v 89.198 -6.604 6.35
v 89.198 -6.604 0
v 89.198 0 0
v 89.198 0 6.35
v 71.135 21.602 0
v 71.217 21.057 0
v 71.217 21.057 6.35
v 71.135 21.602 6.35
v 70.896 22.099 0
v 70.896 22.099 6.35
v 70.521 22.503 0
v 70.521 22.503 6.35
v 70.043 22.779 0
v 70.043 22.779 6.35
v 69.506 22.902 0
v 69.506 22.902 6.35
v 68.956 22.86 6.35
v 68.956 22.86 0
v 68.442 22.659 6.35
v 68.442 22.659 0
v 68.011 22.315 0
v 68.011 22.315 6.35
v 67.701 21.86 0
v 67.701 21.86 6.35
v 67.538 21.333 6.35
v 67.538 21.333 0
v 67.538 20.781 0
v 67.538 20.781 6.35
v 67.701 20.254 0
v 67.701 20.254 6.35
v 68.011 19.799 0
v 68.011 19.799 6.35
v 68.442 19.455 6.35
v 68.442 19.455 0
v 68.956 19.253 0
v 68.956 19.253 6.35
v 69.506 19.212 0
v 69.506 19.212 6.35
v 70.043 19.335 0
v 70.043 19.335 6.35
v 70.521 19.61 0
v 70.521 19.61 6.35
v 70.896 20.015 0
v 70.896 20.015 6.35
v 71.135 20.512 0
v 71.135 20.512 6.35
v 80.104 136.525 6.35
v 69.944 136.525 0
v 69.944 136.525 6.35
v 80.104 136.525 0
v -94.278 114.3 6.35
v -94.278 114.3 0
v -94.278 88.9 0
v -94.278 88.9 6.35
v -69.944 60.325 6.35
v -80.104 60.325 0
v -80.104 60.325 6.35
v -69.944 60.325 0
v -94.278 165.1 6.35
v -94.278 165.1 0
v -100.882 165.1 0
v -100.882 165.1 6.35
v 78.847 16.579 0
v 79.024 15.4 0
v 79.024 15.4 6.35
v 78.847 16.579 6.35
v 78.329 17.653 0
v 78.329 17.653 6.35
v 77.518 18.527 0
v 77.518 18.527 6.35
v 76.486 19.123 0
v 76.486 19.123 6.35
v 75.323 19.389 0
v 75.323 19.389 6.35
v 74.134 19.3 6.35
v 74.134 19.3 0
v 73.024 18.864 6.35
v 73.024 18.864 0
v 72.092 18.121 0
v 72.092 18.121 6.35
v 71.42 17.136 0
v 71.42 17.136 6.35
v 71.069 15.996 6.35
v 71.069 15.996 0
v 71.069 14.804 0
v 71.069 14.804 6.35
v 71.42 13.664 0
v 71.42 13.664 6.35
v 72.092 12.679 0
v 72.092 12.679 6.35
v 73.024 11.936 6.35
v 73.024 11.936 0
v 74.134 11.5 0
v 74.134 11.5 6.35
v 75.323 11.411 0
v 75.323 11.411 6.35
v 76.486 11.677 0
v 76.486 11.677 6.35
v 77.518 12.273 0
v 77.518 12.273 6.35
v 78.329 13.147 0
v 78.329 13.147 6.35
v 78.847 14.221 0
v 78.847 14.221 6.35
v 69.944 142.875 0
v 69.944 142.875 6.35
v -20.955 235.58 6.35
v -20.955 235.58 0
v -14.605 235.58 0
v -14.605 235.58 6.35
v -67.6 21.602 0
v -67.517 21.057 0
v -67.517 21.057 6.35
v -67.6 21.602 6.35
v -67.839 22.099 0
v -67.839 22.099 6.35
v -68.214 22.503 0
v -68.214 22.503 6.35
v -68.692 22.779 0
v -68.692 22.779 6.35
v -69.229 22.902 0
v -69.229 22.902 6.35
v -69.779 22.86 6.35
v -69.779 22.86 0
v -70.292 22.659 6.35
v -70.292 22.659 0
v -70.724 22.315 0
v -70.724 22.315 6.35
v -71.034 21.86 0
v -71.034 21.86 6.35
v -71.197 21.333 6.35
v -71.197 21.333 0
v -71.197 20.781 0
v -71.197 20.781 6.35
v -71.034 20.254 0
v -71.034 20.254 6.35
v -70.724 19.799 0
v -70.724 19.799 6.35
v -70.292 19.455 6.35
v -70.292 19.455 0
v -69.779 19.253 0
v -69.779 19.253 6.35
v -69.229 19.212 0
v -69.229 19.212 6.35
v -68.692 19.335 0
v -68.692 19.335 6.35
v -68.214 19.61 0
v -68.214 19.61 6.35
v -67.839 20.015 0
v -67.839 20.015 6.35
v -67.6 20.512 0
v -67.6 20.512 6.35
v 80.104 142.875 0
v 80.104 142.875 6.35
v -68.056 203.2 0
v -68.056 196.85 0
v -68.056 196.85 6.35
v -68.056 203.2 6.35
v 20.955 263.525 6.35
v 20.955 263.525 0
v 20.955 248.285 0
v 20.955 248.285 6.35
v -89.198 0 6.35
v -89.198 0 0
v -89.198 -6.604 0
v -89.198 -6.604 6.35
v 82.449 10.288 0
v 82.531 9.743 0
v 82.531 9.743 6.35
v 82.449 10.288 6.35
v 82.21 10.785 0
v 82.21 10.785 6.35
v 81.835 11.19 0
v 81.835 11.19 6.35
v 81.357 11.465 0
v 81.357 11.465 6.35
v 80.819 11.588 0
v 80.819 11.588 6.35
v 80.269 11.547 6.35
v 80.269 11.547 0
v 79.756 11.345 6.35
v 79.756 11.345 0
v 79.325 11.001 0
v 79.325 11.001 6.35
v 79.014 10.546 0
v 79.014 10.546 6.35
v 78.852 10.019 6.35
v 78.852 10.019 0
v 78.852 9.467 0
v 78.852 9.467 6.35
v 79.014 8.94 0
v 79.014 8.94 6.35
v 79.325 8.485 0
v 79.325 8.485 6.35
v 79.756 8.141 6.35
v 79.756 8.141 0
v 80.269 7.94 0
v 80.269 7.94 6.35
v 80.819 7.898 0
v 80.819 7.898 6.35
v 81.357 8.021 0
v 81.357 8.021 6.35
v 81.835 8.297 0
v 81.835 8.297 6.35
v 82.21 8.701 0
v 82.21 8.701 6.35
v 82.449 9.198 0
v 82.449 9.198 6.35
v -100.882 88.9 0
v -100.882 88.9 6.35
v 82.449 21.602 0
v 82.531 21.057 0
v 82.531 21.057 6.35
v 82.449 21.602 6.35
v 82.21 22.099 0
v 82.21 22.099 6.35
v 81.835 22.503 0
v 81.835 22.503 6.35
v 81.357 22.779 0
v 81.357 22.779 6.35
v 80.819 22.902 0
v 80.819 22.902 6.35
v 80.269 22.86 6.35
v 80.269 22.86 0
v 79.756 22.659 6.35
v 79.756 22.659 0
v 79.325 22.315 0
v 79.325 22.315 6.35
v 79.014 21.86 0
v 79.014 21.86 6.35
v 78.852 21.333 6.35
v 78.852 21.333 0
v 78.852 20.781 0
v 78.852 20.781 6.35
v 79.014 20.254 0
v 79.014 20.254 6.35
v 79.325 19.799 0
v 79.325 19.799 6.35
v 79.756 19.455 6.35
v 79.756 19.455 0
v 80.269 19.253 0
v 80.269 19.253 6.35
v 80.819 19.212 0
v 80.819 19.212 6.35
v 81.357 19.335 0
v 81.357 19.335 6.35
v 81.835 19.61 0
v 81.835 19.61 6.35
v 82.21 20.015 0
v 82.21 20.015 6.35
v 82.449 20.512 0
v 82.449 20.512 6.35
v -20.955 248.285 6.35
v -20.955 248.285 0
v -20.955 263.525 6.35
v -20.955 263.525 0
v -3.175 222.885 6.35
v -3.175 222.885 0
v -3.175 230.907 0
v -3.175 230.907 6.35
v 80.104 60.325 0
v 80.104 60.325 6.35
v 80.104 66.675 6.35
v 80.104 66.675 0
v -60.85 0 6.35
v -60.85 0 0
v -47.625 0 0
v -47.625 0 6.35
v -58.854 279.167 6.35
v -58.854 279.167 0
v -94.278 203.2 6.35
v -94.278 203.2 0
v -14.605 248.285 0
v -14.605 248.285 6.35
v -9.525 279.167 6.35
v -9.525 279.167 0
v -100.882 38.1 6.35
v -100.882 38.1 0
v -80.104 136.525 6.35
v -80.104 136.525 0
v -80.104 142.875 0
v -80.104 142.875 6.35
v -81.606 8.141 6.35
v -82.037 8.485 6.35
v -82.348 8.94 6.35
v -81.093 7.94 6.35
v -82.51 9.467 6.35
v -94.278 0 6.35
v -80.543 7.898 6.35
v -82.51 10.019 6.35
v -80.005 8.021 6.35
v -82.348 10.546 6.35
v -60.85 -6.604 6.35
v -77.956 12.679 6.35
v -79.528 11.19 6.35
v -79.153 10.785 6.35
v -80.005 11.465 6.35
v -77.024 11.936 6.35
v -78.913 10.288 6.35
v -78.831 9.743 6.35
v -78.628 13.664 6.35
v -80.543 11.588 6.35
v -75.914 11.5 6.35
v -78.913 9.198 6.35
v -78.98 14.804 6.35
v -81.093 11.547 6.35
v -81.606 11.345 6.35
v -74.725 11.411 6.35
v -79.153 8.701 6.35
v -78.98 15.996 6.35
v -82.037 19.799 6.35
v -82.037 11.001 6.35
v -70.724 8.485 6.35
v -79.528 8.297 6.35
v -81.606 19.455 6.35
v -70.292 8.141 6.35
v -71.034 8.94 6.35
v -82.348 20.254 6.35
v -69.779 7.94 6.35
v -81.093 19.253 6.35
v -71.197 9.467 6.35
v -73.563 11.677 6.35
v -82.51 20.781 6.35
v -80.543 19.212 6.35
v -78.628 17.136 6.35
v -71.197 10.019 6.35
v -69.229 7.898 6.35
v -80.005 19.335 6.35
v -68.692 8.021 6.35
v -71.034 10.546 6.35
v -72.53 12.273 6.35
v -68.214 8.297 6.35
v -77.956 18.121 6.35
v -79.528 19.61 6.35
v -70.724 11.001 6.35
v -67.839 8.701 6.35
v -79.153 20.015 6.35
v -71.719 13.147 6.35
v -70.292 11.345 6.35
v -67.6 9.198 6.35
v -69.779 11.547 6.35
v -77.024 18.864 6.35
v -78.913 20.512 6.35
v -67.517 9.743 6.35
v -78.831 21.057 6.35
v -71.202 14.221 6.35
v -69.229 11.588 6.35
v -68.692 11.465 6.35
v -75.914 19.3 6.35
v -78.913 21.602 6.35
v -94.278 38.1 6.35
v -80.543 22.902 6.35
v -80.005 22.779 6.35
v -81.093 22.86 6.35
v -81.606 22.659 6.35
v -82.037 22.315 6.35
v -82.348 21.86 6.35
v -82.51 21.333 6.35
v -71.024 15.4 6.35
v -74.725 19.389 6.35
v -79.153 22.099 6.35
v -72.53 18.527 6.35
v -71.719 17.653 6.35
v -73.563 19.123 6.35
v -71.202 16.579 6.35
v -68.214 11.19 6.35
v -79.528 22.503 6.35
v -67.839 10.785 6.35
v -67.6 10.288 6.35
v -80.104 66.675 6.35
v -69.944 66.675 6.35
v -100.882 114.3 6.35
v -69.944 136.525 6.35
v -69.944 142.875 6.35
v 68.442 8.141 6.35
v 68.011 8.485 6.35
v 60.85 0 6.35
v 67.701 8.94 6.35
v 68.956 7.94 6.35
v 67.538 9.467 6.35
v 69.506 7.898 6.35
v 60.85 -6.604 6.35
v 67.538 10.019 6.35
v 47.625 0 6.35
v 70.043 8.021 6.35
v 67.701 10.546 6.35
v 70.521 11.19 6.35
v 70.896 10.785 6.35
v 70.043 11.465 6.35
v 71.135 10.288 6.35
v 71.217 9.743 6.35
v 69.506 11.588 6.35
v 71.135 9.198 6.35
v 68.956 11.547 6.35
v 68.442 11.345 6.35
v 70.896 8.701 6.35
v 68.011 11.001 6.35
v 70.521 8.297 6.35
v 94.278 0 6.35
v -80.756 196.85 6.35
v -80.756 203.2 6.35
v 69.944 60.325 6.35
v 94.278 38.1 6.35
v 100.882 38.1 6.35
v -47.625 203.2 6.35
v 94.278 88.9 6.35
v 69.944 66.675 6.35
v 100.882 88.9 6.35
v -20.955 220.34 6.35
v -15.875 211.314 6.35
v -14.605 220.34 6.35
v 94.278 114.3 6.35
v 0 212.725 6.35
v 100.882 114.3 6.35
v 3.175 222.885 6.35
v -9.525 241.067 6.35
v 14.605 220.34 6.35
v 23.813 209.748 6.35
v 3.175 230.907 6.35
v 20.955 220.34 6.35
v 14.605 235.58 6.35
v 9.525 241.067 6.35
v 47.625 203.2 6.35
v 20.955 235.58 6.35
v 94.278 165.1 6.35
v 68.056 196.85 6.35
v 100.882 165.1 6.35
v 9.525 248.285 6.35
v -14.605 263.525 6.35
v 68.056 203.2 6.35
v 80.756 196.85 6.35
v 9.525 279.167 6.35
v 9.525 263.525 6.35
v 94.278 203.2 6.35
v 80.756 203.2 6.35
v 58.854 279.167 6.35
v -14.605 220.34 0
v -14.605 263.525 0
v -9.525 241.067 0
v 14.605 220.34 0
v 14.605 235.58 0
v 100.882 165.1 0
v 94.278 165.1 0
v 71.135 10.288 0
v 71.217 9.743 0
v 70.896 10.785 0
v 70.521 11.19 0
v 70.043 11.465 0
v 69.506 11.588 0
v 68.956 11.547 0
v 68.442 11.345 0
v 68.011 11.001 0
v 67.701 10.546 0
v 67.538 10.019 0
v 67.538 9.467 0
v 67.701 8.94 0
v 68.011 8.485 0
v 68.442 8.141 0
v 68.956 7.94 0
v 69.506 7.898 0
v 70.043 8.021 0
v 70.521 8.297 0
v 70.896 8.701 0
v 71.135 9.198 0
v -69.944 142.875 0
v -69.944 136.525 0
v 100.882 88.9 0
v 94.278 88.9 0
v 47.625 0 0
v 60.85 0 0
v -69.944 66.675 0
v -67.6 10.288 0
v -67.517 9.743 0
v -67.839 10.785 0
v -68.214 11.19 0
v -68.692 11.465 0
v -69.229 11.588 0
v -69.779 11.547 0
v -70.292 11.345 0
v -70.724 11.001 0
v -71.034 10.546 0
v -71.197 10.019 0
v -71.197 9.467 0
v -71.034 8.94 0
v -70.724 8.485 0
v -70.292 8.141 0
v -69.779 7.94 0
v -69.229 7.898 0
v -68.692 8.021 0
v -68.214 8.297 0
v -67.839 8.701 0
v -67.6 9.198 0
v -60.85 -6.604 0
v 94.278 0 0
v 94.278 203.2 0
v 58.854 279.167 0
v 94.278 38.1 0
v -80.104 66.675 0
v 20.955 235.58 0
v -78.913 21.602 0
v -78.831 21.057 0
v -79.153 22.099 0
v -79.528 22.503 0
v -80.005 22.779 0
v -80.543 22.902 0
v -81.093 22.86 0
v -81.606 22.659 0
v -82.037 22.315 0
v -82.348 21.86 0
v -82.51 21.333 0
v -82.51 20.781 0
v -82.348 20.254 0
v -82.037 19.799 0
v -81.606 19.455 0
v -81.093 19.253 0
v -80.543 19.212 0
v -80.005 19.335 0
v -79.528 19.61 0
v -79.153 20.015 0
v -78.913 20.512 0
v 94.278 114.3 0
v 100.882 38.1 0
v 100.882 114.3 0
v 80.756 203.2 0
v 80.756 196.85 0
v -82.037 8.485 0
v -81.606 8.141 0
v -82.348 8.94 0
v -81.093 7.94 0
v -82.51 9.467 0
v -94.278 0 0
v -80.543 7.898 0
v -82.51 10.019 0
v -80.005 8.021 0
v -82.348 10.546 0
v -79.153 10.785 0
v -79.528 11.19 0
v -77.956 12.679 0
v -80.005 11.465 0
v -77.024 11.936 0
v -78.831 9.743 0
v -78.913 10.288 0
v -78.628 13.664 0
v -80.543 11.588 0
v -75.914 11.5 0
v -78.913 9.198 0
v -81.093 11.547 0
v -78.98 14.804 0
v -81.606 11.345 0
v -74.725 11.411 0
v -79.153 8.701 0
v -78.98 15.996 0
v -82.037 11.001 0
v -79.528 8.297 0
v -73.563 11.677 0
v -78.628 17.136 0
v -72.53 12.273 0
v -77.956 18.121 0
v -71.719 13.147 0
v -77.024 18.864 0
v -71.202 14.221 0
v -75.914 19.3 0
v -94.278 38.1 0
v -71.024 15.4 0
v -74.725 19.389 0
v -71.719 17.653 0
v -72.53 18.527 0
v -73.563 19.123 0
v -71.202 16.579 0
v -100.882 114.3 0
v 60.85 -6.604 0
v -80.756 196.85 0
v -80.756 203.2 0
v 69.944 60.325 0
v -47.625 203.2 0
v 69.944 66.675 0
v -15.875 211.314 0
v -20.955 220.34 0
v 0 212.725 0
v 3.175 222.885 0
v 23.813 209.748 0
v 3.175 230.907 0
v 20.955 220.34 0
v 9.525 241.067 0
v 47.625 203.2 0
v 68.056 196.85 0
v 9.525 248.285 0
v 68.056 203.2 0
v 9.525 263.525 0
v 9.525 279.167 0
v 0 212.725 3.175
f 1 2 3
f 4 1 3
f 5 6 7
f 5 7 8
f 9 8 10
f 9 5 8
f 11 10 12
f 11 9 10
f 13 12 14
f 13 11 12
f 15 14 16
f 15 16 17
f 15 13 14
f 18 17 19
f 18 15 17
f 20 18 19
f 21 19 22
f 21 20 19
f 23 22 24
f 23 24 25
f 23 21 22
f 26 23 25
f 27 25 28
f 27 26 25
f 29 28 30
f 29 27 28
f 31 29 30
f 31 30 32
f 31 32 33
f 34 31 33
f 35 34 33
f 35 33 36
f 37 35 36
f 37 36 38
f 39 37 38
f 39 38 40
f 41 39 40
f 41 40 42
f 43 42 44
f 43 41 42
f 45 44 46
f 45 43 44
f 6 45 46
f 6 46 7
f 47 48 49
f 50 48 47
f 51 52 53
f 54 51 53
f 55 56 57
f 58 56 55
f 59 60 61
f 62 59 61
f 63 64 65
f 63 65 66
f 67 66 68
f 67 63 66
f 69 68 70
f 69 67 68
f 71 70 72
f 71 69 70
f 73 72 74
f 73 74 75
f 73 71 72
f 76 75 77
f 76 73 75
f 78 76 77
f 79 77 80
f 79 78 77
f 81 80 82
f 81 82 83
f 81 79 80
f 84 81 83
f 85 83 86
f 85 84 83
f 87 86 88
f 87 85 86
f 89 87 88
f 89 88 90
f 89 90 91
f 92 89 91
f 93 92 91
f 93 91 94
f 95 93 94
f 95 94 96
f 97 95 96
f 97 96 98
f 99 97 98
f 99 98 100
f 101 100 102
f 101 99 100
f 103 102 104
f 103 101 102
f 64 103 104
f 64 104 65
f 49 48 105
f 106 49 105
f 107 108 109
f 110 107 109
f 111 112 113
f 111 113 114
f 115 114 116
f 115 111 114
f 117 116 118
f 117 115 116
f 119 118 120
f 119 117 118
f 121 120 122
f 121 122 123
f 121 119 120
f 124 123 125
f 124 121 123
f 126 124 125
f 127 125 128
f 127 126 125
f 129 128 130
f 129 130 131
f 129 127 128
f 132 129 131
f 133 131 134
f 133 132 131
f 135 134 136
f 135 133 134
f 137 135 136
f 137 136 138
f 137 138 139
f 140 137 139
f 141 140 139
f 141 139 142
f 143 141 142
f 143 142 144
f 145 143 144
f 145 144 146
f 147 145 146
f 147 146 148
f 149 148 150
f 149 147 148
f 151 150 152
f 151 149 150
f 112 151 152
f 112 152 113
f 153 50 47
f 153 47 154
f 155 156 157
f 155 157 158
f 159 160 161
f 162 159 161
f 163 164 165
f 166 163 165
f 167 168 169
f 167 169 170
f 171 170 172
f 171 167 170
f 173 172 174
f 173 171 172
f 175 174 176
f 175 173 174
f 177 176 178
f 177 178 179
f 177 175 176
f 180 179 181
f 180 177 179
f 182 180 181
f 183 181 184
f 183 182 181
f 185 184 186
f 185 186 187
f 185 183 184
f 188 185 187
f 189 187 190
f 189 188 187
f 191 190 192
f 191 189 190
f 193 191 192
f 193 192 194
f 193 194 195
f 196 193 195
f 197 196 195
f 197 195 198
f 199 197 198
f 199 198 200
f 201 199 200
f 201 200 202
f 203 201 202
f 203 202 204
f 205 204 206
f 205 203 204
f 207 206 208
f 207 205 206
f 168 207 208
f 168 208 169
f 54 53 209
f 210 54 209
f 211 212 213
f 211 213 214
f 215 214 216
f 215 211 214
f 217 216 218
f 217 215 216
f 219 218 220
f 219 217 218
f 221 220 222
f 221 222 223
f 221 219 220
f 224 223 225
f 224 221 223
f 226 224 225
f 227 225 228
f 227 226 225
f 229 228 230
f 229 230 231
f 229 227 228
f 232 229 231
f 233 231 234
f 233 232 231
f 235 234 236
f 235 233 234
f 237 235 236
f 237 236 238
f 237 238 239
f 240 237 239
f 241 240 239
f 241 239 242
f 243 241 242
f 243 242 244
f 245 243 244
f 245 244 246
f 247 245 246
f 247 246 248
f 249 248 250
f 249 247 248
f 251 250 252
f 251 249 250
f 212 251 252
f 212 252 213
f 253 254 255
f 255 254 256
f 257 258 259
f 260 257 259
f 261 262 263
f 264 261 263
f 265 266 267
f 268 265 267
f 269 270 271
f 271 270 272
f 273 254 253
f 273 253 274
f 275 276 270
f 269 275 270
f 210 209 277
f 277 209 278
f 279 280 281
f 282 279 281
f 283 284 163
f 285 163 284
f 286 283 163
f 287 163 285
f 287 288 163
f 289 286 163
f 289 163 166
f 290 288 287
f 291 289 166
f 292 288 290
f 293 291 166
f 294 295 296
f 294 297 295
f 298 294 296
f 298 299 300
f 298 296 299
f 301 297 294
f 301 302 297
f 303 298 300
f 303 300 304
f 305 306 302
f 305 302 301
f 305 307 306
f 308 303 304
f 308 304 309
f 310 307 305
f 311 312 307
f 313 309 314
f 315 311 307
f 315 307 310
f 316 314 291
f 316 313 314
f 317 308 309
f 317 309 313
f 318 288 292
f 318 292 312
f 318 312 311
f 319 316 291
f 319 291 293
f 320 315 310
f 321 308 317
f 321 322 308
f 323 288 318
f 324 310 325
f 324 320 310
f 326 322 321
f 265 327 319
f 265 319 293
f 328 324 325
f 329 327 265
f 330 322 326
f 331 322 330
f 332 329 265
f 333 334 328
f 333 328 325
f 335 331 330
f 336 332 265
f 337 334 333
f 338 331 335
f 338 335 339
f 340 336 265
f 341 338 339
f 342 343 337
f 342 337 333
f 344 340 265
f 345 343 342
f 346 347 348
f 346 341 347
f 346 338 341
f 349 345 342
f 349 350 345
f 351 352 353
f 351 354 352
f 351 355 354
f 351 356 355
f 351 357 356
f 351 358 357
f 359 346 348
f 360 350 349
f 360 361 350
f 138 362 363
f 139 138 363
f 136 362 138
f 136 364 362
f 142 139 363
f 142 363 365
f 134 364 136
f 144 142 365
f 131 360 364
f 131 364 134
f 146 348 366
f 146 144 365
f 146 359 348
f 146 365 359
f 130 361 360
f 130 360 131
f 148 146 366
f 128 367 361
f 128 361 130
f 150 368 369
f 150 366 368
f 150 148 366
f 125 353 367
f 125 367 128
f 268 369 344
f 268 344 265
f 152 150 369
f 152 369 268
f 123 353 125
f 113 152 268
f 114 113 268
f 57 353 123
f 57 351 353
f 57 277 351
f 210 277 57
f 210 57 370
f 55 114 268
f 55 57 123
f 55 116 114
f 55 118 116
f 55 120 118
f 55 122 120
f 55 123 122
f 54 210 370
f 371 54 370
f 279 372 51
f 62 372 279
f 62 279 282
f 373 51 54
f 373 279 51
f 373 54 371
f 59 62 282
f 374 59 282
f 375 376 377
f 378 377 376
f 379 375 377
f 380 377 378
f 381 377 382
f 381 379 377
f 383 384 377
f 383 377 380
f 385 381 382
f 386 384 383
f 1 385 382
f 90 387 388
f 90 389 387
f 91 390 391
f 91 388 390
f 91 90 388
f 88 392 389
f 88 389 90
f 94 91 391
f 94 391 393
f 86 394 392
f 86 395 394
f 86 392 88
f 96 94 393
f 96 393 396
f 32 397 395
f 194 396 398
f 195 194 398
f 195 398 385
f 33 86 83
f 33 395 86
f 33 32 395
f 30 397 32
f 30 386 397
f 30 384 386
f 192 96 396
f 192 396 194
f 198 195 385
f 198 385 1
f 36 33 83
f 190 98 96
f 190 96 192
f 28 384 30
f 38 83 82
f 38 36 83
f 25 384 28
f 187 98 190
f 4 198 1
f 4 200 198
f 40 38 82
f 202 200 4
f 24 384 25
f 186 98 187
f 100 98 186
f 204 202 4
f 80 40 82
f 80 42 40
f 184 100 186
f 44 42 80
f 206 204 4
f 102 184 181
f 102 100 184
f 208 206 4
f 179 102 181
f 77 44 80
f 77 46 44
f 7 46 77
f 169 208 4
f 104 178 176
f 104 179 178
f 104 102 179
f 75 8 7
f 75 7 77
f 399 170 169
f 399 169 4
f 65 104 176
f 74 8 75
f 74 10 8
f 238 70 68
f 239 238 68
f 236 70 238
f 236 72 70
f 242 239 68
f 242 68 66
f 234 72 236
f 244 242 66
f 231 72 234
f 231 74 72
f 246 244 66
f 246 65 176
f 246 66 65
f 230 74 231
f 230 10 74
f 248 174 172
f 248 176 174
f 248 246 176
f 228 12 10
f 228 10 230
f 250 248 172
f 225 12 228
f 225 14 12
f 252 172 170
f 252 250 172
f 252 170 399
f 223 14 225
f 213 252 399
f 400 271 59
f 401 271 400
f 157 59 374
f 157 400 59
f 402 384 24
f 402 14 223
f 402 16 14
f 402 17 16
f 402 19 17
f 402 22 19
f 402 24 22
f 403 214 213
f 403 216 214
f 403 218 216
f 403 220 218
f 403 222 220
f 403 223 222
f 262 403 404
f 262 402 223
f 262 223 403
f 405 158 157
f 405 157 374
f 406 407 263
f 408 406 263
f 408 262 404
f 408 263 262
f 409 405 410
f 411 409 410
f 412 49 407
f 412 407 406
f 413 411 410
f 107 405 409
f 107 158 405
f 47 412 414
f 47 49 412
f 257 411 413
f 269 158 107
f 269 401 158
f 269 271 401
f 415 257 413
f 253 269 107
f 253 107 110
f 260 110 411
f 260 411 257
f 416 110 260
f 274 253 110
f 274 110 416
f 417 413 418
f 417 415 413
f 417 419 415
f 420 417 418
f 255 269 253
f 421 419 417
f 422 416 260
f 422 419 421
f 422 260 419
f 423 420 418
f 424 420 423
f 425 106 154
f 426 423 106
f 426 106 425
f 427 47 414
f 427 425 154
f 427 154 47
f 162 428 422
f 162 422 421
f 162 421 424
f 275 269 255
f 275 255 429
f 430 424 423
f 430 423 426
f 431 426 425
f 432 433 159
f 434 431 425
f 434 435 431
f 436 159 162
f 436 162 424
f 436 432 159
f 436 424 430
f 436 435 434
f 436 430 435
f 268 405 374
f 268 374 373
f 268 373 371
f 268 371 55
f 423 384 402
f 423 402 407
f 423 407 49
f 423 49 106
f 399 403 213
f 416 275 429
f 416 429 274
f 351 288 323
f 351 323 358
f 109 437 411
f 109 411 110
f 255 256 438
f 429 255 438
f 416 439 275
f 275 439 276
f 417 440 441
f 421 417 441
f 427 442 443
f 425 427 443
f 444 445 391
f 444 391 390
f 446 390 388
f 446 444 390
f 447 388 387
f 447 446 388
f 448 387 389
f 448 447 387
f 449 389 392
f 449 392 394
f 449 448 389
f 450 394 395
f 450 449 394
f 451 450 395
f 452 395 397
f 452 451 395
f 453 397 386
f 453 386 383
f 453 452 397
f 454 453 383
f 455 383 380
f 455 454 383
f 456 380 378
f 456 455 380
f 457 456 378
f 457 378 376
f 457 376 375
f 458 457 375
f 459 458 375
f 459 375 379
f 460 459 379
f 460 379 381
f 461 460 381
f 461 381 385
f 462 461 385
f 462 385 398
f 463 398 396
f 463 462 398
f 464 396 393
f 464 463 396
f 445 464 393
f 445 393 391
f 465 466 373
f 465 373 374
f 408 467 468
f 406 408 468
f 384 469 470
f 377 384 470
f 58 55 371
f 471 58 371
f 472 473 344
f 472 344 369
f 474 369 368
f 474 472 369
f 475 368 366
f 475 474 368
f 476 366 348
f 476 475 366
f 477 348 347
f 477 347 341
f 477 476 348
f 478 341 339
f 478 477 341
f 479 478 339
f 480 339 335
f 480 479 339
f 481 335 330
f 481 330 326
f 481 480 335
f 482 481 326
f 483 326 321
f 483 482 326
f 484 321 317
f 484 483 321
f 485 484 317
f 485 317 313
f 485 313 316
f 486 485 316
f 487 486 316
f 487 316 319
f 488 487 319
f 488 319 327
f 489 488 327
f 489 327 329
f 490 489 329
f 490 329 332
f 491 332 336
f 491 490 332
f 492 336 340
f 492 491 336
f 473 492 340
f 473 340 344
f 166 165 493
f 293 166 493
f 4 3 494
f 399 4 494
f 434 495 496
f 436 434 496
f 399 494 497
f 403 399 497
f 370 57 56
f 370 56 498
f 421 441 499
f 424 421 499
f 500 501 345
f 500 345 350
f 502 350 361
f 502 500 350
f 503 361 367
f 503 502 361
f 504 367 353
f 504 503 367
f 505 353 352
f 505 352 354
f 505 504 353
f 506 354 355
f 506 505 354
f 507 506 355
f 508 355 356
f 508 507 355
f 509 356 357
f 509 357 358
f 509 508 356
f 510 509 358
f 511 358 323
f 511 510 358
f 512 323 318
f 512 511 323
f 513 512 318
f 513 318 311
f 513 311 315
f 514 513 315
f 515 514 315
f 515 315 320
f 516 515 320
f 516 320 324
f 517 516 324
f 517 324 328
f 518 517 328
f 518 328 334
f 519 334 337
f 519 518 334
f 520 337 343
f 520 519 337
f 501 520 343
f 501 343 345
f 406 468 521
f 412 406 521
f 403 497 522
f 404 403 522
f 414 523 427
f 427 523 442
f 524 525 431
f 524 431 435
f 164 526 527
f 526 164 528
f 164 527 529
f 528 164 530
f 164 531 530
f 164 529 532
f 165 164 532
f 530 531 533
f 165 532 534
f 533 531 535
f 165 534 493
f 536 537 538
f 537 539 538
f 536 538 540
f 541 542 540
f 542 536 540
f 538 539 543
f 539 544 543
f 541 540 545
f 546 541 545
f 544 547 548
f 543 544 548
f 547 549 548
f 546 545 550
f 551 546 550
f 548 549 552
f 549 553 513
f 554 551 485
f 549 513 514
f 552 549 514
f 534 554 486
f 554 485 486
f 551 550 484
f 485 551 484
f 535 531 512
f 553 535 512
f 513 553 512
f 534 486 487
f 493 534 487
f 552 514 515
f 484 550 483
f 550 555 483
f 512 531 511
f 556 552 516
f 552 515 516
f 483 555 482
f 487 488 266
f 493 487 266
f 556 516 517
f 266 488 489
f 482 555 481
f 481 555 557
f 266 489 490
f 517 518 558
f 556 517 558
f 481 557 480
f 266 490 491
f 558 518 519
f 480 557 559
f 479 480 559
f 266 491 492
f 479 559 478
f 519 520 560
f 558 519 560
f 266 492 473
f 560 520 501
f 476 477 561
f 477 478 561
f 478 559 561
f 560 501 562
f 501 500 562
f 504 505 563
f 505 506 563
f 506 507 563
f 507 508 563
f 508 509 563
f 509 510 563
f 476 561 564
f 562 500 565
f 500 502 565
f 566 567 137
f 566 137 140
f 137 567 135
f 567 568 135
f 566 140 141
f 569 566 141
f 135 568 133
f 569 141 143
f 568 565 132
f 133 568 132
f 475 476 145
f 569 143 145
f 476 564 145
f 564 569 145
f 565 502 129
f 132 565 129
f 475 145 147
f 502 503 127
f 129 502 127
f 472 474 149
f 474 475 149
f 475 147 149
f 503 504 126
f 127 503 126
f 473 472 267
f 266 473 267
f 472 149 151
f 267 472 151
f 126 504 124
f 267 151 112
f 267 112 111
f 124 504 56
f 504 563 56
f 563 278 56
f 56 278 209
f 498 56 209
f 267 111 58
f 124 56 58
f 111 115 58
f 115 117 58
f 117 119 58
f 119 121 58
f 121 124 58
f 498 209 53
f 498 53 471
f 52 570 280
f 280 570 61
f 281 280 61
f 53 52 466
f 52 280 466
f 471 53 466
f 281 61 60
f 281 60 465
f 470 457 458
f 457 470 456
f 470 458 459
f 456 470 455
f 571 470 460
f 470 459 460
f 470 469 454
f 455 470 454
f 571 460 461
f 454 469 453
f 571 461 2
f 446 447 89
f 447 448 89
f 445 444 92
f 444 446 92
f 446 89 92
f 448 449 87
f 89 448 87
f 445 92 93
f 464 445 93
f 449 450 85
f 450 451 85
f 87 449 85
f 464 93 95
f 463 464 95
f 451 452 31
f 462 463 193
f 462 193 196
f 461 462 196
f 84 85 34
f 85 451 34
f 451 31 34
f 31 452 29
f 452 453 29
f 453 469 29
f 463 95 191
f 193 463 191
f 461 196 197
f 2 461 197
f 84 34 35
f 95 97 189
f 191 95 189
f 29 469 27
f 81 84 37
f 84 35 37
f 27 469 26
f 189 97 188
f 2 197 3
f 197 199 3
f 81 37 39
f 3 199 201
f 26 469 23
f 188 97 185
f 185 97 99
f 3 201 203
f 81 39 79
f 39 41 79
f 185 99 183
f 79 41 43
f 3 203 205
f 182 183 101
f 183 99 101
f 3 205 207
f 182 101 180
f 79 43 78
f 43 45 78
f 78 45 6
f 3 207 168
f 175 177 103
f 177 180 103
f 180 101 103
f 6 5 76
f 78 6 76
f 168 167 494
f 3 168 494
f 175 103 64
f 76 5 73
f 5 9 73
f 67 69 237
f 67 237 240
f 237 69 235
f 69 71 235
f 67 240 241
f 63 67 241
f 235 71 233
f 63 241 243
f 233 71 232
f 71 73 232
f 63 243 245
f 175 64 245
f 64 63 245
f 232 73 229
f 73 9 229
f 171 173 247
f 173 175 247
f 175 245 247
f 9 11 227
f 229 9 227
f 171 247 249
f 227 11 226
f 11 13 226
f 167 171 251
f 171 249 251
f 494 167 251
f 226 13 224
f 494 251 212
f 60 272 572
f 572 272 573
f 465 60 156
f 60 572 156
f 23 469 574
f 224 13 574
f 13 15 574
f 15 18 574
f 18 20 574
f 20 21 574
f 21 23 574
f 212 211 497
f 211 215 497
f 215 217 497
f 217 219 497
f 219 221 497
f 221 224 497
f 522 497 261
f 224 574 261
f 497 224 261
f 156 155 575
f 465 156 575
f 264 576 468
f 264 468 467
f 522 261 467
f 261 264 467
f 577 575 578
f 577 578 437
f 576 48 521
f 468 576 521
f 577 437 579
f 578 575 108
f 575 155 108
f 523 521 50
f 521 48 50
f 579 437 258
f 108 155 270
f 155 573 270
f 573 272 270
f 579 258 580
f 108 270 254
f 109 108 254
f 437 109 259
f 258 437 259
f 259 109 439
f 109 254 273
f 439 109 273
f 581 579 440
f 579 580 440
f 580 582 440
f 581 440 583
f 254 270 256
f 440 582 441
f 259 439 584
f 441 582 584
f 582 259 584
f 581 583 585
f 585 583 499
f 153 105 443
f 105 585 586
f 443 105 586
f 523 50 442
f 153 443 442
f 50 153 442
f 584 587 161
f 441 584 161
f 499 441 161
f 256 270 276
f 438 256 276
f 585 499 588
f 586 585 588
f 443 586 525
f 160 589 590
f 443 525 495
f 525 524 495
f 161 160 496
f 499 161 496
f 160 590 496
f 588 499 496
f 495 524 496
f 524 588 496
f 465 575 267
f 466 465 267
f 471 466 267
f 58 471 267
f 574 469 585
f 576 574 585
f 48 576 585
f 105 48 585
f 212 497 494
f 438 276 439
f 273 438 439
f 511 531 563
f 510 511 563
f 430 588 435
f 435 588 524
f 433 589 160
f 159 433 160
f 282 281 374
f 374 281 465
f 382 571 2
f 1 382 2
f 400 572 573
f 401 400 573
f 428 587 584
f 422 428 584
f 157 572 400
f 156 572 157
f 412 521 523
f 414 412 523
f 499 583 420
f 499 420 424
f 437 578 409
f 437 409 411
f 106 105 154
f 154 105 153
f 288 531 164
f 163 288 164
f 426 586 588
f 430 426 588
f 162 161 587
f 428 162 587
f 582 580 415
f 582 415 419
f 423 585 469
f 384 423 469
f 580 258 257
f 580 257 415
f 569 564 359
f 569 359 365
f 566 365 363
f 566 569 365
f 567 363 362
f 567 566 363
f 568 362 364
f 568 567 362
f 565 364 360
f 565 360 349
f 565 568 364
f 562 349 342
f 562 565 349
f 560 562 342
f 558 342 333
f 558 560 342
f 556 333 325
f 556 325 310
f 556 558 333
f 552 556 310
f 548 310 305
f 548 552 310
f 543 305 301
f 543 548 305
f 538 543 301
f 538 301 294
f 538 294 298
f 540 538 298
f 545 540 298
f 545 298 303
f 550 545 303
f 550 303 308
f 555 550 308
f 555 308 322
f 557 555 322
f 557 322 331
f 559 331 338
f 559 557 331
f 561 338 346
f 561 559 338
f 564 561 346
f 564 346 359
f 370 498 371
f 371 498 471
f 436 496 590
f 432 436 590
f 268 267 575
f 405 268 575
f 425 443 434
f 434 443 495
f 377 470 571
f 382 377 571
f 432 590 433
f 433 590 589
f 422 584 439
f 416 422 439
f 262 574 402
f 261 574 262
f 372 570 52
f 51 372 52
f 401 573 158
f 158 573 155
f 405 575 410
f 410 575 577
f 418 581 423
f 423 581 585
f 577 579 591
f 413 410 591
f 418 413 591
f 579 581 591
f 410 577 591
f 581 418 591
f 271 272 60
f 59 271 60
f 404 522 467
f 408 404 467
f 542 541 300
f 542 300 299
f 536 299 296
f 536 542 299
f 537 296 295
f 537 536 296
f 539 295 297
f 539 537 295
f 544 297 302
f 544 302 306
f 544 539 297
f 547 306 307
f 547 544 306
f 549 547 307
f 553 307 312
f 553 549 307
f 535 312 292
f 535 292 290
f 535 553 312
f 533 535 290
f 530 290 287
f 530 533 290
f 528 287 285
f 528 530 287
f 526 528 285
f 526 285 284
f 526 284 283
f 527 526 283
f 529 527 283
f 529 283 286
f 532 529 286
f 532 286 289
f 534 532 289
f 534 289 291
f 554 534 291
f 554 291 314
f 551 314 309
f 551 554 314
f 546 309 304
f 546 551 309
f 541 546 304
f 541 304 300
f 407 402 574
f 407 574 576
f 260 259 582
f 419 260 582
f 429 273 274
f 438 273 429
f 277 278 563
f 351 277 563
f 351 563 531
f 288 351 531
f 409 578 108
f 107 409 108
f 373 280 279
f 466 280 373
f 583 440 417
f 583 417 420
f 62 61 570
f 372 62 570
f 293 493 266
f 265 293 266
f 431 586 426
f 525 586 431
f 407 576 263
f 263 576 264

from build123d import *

# Parameters (mm, degrees)
F0_R     = 1.85
F0_R_2   = 4
F0_W     = 10.16
F0_H     = 6.35
F0_W_2   = 12.7
F0_W_3   = 6.35
F0_H_2   = 15.24
F0_H_3   = 8.021719
F1_DEPTH = 6.35


with BuildPart() as f1:
    # F0 (on Top) → F1 (new body)
    with BuildSketch(Plane.XY):
        with BuildLine():
            Line((-60.850162, -6.604), (-60.850162, 0))
            Line((-60.850162, 0), (-47.625, 0))
            Line((-47.625, 0), (-47.625, 203.2))
            add(Edge.make_bspline(
                [(-47.625, 203.2), (-31.75, 207.9625), (0, 217.4875), (31.75, 207.9625), (47.625, 203.2)],
                knots=[0, 0, 0, 0, 48.568161, 97.136322, 97.136322, 97.136322, 97.136322], degree=3))
            Line((47.625, 203.2), (47.625, 0))
            Line((47.625, 0), (60.850162, 0))
            Line((60.850162, 0), (60.850162, -6.604))
            Line((60.850162, -6.604), (89.198314, -6.604))
            Line((89.198314, -6.604), (89.198314, 0))
            Line((89.198314, 0), (94.278314, 0))
            Line((94.278314, 0), (94.278314, 38.1))
            Line((94.278314, 38.1), (100.882314, 38.1))
            Line((100.882314, 38.1), (100.882314, 88.9))
            Line((100.882314, 88.9), (94.278314, 88.9))
            Line((94.278314, 88.9), (94.278314, 114.3))
            Line((94.278314, 114.3), (100.882314, 114.3))
            Line((100.882314, 114.3), (100.882314, 165.1))
            Line((100.882314, 165.1), (94.278314, 165.1))
            Line((94.278314, 165.1), (94.278314, 203.2))
            Line((94.278314, 203.2), (58.854451, 279.166719))
            Line((58.854451, 279.166719), (9.525, 279.166719))
            Line((9.525, 279.166719), (9.525, 263.525))
            Line((9.525, 263.525), (20.955, 263.525))
            Line((20.955, 263.525), (20.955, 248.285))
            Line((20.955, 248.285), (9.525, 248.285))
            Line((9.525, 248.285), (9.525, 241.066719))
            Line((9.525, 241.066719), (-9.525, 241.066719))
            Line((-9.525, 241.066719), (-9.525, 279.166719))
            Line((-9.525, 279.166719), (-58.854451, 279.166719))
            Line((-58.854451, 279.166719), (-94.278314, 203.2))
            Line((-94.278314, 203.2), (-94.278314, 165.1))
            Line((-94.278314, 165.1), (-100.882314, 165.1))
            Line((-100.882314, 165.1), (-100.882314, 114.3))
            Line((-100.882314, 114.3), (-94.278314, 114.3))
            Line((-94.278314, 114.3), (-94.278314, 88.9))
            Line((-94.278314, 88.9), (-100.882314, 88.9))
            Line((-100.882314, 88.9), (-100.882314, 38.1))
            Line((-100.882314, 38.1), (-94.278314, 38.1))
            Line((-94.278314, 38.1), (-94.278314, 0))
            Line((-94.278314, 0), (-89.198314, 0))
            Line((-89.198314, 0), (-89.198314, -6.604))
            Line((-89.198314, -6.604), (-60.850162, -6.604))
        make_face()
        with Locations((-80.681092, 9.743146)):
            Circle(F0_R, mode=Mode.SUBTRACT)
        with Locations((-80.681092, 21.056854)):
            Circle(F0_R, mode=Mode.SUBTRACT)
        with Locations((-69.367384, 9.743146)):
            Circle(F0_R, mode=Mode.SUBTRACT)
        with Locations((-75.024238, 15.4)):
            Circle(F0_R_2, mode=Mode.SUBTRACT)
        with Locations((-69.367384, 21.056854)):
            Circle(F0_R, mode=Mode.SUBTRACT)
        with Locations((-75.024238, 63.5)):
            Rectangle(F0_W, F0_H, mode=Mode.SUBTRACT)
        with Locations((69.367384, 9.743146)):
            Circle(F0_R, mode=Mode.SUBTRACT)
        with Locations((75.024238, 15.4)):
            Circle(F0_R_2, mode=Mode.SUBTRACT)
        with Locations((69.367384, 21.056854)):
            Circle(F0_R, mode=Mode.SUBTRACT)
        with Locations((80.681092, 9.743146)):
            Circle(F0_R, mode=Mode.SUBTRACT)
        with Locations((80.681092, 21.056854)):
            Circle(F0_R, mode=Mode.SUBTRACT)
        with Locations((75.024238, 63.5)):
            Rectangle(F0_W, F0_H, mode=Mode.SUBTRACT)
        with Locations((-75.024238, 139.7)):
            Rectangle(F0_W, F0_H, mode=Mode.SUBTRACT)
        with Locations((-74.405786, 200.025)):
            Rectangle(F0_W_2, F0_H, mode=Mode.SUBTRACT)
        with Locations((-17.78, 227.960319)):
            Rectangle(F0_W_3, F0_H_2, mode=Mode.SUBTRACT)
        with Locations((-17.78, 255.905)):
            Rectangle(F0_W_3, F0_H_2, mode=Mode.SUBTRACT)
        with Locations((75.024238, 139.7)):
            Rectangle(F0_W, F0_H, mode=Mode.SUBTRACT)
        with Locations((74.405786, 200.025)):
            Rectangle(F0_W_2, F0_H, mode=Mode.SUBTRACT)
        with Locations((0, 226.895859)):
            Rectangle(F0_W_3, F0_H_3, mode=Mode.SUBTRACT)
        with Locations((17.78, 227.960319)):
            Rectangle(F0_W_3, F0_H_2, mode=Mode.SUBTRACT)
    extrude(amount=F1_DEPTH)


solid = f1.part
